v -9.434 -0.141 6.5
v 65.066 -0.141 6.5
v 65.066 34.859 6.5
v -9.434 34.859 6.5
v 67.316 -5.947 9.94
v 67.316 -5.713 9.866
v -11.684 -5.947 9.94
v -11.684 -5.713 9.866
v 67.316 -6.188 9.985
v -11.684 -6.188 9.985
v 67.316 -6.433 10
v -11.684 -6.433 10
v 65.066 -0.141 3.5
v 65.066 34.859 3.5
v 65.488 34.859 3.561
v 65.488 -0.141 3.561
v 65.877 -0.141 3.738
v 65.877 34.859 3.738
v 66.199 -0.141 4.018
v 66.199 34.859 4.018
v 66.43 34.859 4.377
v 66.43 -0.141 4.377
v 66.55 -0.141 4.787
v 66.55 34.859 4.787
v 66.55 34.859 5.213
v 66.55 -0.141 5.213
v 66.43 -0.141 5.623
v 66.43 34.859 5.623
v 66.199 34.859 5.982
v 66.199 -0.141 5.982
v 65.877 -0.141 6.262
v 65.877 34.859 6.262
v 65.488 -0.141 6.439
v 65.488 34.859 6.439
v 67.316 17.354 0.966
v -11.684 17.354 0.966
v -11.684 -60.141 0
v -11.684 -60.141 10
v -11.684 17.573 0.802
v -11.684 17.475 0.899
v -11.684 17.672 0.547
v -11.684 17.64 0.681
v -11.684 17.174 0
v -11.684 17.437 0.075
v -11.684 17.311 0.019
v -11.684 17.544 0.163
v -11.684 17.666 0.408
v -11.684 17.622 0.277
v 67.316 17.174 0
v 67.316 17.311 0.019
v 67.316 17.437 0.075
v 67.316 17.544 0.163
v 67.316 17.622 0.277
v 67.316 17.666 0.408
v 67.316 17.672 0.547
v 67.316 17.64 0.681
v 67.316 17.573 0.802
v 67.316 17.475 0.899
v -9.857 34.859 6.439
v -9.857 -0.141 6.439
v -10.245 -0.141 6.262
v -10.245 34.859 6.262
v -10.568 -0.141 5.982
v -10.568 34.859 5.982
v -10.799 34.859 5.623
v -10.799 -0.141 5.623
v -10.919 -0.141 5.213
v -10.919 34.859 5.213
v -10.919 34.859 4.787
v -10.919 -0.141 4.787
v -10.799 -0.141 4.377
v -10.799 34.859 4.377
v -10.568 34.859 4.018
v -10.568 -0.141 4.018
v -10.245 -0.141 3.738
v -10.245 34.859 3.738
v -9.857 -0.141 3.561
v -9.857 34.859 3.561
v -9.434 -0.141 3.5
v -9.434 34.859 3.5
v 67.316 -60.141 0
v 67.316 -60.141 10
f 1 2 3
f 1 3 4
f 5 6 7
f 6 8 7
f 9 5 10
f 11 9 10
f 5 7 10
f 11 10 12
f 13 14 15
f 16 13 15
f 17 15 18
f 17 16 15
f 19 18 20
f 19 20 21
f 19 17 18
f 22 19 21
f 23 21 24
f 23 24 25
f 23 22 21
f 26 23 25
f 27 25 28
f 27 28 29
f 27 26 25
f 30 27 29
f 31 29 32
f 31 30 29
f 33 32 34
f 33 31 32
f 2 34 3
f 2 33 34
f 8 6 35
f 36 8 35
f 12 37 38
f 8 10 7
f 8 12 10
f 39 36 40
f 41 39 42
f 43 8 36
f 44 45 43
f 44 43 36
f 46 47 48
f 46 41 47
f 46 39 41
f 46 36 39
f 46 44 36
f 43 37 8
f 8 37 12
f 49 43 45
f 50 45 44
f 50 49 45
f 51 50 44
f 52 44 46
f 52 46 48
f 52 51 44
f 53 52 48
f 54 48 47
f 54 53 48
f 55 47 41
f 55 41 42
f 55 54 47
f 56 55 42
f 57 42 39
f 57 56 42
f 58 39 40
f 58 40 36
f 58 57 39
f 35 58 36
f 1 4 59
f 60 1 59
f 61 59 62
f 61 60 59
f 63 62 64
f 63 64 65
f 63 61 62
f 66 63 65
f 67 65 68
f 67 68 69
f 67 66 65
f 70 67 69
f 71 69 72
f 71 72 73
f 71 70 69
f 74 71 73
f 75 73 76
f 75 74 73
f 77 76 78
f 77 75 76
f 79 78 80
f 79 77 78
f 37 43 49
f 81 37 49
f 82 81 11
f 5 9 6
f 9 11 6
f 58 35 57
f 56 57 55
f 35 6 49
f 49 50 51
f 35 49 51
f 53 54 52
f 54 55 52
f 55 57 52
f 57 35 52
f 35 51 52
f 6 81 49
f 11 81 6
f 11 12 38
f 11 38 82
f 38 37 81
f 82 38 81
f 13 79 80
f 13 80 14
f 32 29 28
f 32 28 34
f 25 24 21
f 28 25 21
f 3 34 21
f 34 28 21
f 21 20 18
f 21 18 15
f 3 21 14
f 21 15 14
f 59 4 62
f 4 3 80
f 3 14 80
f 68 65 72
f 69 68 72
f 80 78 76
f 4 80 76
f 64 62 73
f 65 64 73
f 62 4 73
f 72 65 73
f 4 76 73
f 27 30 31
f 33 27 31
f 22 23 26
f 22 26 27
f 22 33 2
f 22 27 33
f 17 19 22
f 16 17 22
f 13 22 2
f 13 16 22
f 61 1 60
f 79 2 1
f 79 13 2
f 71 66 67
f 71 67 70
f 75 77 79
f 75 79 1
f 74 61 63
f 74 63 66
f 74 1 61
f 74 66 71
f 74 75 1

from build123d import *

# Parameters (mm, degrees)
CROQUIS1_W                   = 79
CROQUIS1_H                   = 80
SALIENTE_EXTRUIR1_DEPTH      = 10
CORTAR_EXTRUIR2_DEPTH        = 80
REDONDEO3_R                  = 0.5
REDONDEO4_R                  = 2
SALIENTE_EXTRUIR2_DEPTH      = 15
SALIENTE_EXTRUIR2_DEPTH_BACK = 20


with BuildPart() as part:
    # Croquis1 → Saliente-Extruir1 (new body)
    with BuildSketch(Plane.XY):
        with Locations((27.815761317, -20.14086116)):
            Rectangle(CROQUIS1_W, CROQUIS1_H)
    extrude(amount=SALIENTE_EXTRUIR1_DEPTH)

    # Croquis3 → Cortar-Extruir2 (cut)
    with BuildSketch(Plane(origin=(67.315761317, 0, 0), x_dir=(0, 0, -1), z_dir=(1, 0, 0))):
        Polygon((-10, 19.85913884), (-10, -6.06086116), (0, 19.85913884), align=None)
    extrude(amount=-CORTAR_EXTRUIR2_DEPTH, mode=Mode.SUBTRACT)

    # Redondeo3
    redondeo3_edges = [part.edges().sort_by_distance(p)[0] for p in [
        (27.815761317, 19.85913884, 0),
    ]]
    fillet(redondeo3_edges, radius=REDONDEO3_R)

    # Redondeo4
    redondeo4_edges = [part.edges().sort_by_distance(p)[0] for p in [
        (27.815761317, -6.06086116, 10),
    ]]
    fillet(redondeo4_edges, radius=REDONDEO4_R)


with BuildPart() as body_2:
    # Croquis2 → Saliente-Extruir2 (new, two sides: drawn at the far end of the back side and taken through both)
    with BuildSketch(Plane(origin=(0, 19.85913884, 0), x_dir=(1, 0, 0), z_dir=(0, 1, 0)).offset(-SALIENTE_EXTRUIR2_DEPTH_BACK)):
        with BuildLine():
            Line((65.065761317, -6.5), (-9.434238683, -6.5))
            ThreePointArc((-9.434238683, -6.5), (-10.934238683, -5), (-9.434238683, -3.5))
            Line((-9.434238683, -3.5), (65.065761317, -3.5))
            ThreePointArc((65.065761317, -3.5), (66.565761317, -5), (65.065761317, -6.5))
        make_face()
    extrude(amount=SALIENTE_EXTRUIR2_DEPTH + SALIENTE_EXTRUIR2_DEPTH_BACK)


solid = Compound([part.part, body_2.part])
